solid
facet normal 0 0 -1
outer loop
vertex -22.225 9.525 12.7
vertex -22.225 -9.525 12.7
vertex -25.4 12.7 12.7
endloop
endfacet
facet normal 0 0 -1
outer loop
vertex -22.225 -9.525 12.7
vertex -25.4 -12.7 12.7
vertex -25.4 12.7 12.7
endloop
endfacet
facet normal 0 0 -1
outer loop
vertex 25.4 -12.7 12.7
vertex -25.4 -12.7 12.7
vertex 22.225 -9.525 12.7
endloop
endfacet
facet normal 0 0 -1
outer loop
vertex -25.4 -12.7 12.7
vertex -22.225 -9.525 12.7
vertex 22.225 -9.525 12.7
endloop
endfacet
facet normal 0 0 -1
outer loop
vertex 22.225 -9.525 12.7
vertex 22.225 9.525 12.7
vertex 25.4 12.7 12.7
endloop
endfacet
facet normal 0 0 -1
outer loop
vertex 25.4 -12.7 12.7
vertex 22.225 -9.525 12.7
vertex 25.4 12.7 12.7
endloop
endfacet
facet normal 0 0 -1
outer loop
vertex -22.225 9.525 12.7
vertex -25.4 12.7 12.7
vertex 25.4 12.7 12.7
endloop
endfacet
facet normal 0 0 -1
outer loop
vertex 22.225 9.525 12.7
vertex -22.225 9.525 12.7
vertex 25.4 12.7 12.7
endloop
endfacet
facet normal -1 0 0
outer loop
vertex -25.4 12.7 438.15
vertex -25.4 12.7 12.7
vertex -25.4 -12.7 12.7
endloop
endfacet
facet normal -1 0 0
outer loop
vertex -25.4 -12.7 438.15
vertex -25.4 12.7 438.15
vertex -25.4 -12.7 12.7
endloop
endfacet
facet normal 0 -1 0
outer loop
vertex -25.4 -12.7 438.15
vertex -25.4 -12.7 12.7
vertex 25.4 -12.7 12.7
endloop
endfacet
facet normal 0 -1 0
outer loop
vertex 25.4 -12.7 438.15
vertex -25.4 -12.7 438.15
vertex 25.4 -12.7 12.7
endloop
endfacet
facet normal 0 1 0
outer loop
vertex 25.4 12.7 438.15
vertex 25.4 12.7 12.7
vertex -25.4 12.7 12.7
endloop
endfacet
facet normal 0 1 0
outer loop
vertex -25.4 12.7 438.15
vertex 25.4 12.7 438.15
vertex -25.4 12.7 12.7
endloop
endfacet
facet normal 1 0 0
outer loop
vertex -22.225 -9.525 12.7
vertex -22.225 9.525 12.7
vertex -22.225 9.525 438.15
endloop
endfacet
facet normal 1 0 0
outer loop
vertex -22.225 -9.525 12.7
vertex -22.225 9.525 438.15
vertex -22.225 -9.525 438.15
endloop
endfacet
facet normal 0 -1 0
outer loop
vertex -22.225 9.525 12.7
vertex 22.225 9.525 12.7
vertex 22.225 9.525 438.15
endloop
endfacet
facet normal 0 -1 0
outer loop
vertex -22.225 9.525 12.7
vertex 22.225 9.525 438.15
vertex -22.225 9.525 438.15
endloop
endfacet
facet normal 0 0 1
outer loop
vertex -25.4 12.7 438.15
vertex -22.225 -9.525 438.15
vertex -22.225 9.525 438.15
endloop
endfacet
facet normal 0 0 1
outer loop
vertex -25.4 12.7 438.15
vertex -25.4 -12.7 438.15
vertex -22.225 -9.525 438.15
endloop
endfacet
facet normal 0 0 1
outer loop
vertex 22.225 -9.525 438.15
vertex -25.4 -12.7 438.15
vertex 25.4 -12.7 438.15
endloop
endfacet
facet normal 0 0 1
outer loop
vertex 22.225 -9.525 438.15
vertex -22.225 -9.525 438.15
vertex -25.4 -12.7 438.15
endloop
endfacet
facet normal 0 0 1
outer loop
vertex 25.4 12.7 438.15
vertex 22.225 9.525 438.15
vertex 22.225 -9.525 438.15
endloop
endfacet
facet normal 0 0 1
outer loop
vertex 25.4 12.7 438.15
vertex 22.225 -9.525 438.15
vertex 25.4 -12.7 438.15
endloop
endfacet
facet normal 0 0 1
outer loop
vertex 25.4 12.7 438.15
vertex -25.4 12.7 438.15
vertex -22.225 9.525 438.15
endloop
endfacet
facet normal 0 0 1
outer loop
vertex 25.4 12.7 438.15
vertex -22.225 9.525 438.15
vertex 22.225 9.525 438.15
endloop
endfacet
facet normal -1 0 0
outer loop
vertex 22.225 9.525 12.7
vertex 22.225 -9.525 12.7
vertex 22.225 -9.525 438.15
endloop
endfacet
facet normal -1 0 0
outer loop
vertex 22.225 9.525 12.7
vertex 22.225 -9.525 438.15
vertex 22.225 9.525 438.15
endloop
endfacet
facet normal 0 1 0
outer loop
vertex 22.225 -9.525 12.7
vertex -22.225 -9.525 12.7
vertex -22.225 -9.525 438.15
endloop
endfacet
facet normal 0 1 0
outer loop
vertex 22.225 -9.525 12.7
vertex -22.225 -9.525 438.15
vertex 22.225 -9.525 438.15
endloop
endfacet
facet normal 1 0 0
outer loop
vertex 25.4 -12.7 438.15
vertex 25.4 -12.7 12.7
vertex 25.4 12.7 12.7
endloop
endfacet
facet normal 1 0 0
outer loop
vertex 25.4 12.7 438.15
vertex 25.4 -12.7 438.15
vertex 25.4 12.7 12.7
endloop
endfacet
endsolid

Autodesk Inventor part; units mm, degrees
ref_plane "Start Plane" through (0, 0, 12.7) normal (0, 0, 1) x (1, 0, 0)
ref_plane "End Plane" through (0, 0, 438.15) normal (0, 0, 1) x (1, 0, 0)
sketch "Sketch" plane through (0, 0, 0) normal (0, 0, 1) x (1, 0, 0)
  line L0 (-25.4, -12.7) -> (25.4, -12.7)
  line L1 (25.4, -12.7) -> (25.4, 12.7)
  line L2 (25.4, 12.7) -> (-25.4, 12.7)
  line L3 (-25.4, 12.7) -> (-25.4, -12.7)
  line L4 (-25.4, -12.7) -> (25.4, 12.7) construction
  line L5 (25.4, -12.7) -> (-25.4, 12.7) construction
  line L6 (-22.225, -9.525) -> (22.225, -9.525)
  line L7 (22.225, -9.525) -> (22.225, 9.525)
  line L8 (22.225, 9.525) -> (-22.225, 9.525)
  line L9 (-22.225, 9.525) -> (-22.225, -9.525)
  line L10 (-22.225, -9.525) -> (22.225, 9.525) construction
  line L11 (22.225, -9.525) -> (-22.225, 9.525) construction
  point P0 (0, 0)
  point P1 (0, 0)
  dimension "d0" = 50.8
  dimension "d1" = 25.4
  dimension "d2" = 3.175
  dimension "d3" = 3.175
extrude "Body" add sketch "Sketch" along normal up to surface (425.45 mm away) from surface at 12.7
sketch "Sketch4" plane through (0, 0, 0) normal (0, 0, 1) x (1, 0, 0)
  line L0 (0, 0) -> (10, 0)
ref_plane "Work Plane4" through (0, 0, 0) normal (0, -1, 0) x (1, 0, 0)
sketch "Sketch5" plane through (0, 0, 0) normal (0, -1, 0) x (1, 0, 0)
  line L0 (-2, 12.7) -> (12, 12.7)
  line L1 (-2, 438.15) -> (12, 438.15)
  dimension "d11" = 425.45
ref_plane "Work Plane5" through (25.4, 419.1, 12.7) normal (0, 0, -1) x (-1, 0, 0)
split "Split1" plane through (25.4, 419.1, 12.7) removes the side toward (0, 0, -1)
ref_plane "Work Plane6" through (25.4, -203.2, 438.15) normal (0, 0, 1) x (1, 0, 0)
split "Split2" plane through (25.4, -203.2, 438.15) removes the side toward (0, 0, 1)
equation "\"G_OFFSET_START\" = -12.7"
equation "\"G_OFFSET_END\" = -12.7"
equation "\"d6\" = -G_OFFSET_START"
equation "\"d7\" = length + G_OFFSET_END"
equation "\"G_L\" = d11"
equation "\"length\" = 450.85"
properties part number "2x1inTubing"
